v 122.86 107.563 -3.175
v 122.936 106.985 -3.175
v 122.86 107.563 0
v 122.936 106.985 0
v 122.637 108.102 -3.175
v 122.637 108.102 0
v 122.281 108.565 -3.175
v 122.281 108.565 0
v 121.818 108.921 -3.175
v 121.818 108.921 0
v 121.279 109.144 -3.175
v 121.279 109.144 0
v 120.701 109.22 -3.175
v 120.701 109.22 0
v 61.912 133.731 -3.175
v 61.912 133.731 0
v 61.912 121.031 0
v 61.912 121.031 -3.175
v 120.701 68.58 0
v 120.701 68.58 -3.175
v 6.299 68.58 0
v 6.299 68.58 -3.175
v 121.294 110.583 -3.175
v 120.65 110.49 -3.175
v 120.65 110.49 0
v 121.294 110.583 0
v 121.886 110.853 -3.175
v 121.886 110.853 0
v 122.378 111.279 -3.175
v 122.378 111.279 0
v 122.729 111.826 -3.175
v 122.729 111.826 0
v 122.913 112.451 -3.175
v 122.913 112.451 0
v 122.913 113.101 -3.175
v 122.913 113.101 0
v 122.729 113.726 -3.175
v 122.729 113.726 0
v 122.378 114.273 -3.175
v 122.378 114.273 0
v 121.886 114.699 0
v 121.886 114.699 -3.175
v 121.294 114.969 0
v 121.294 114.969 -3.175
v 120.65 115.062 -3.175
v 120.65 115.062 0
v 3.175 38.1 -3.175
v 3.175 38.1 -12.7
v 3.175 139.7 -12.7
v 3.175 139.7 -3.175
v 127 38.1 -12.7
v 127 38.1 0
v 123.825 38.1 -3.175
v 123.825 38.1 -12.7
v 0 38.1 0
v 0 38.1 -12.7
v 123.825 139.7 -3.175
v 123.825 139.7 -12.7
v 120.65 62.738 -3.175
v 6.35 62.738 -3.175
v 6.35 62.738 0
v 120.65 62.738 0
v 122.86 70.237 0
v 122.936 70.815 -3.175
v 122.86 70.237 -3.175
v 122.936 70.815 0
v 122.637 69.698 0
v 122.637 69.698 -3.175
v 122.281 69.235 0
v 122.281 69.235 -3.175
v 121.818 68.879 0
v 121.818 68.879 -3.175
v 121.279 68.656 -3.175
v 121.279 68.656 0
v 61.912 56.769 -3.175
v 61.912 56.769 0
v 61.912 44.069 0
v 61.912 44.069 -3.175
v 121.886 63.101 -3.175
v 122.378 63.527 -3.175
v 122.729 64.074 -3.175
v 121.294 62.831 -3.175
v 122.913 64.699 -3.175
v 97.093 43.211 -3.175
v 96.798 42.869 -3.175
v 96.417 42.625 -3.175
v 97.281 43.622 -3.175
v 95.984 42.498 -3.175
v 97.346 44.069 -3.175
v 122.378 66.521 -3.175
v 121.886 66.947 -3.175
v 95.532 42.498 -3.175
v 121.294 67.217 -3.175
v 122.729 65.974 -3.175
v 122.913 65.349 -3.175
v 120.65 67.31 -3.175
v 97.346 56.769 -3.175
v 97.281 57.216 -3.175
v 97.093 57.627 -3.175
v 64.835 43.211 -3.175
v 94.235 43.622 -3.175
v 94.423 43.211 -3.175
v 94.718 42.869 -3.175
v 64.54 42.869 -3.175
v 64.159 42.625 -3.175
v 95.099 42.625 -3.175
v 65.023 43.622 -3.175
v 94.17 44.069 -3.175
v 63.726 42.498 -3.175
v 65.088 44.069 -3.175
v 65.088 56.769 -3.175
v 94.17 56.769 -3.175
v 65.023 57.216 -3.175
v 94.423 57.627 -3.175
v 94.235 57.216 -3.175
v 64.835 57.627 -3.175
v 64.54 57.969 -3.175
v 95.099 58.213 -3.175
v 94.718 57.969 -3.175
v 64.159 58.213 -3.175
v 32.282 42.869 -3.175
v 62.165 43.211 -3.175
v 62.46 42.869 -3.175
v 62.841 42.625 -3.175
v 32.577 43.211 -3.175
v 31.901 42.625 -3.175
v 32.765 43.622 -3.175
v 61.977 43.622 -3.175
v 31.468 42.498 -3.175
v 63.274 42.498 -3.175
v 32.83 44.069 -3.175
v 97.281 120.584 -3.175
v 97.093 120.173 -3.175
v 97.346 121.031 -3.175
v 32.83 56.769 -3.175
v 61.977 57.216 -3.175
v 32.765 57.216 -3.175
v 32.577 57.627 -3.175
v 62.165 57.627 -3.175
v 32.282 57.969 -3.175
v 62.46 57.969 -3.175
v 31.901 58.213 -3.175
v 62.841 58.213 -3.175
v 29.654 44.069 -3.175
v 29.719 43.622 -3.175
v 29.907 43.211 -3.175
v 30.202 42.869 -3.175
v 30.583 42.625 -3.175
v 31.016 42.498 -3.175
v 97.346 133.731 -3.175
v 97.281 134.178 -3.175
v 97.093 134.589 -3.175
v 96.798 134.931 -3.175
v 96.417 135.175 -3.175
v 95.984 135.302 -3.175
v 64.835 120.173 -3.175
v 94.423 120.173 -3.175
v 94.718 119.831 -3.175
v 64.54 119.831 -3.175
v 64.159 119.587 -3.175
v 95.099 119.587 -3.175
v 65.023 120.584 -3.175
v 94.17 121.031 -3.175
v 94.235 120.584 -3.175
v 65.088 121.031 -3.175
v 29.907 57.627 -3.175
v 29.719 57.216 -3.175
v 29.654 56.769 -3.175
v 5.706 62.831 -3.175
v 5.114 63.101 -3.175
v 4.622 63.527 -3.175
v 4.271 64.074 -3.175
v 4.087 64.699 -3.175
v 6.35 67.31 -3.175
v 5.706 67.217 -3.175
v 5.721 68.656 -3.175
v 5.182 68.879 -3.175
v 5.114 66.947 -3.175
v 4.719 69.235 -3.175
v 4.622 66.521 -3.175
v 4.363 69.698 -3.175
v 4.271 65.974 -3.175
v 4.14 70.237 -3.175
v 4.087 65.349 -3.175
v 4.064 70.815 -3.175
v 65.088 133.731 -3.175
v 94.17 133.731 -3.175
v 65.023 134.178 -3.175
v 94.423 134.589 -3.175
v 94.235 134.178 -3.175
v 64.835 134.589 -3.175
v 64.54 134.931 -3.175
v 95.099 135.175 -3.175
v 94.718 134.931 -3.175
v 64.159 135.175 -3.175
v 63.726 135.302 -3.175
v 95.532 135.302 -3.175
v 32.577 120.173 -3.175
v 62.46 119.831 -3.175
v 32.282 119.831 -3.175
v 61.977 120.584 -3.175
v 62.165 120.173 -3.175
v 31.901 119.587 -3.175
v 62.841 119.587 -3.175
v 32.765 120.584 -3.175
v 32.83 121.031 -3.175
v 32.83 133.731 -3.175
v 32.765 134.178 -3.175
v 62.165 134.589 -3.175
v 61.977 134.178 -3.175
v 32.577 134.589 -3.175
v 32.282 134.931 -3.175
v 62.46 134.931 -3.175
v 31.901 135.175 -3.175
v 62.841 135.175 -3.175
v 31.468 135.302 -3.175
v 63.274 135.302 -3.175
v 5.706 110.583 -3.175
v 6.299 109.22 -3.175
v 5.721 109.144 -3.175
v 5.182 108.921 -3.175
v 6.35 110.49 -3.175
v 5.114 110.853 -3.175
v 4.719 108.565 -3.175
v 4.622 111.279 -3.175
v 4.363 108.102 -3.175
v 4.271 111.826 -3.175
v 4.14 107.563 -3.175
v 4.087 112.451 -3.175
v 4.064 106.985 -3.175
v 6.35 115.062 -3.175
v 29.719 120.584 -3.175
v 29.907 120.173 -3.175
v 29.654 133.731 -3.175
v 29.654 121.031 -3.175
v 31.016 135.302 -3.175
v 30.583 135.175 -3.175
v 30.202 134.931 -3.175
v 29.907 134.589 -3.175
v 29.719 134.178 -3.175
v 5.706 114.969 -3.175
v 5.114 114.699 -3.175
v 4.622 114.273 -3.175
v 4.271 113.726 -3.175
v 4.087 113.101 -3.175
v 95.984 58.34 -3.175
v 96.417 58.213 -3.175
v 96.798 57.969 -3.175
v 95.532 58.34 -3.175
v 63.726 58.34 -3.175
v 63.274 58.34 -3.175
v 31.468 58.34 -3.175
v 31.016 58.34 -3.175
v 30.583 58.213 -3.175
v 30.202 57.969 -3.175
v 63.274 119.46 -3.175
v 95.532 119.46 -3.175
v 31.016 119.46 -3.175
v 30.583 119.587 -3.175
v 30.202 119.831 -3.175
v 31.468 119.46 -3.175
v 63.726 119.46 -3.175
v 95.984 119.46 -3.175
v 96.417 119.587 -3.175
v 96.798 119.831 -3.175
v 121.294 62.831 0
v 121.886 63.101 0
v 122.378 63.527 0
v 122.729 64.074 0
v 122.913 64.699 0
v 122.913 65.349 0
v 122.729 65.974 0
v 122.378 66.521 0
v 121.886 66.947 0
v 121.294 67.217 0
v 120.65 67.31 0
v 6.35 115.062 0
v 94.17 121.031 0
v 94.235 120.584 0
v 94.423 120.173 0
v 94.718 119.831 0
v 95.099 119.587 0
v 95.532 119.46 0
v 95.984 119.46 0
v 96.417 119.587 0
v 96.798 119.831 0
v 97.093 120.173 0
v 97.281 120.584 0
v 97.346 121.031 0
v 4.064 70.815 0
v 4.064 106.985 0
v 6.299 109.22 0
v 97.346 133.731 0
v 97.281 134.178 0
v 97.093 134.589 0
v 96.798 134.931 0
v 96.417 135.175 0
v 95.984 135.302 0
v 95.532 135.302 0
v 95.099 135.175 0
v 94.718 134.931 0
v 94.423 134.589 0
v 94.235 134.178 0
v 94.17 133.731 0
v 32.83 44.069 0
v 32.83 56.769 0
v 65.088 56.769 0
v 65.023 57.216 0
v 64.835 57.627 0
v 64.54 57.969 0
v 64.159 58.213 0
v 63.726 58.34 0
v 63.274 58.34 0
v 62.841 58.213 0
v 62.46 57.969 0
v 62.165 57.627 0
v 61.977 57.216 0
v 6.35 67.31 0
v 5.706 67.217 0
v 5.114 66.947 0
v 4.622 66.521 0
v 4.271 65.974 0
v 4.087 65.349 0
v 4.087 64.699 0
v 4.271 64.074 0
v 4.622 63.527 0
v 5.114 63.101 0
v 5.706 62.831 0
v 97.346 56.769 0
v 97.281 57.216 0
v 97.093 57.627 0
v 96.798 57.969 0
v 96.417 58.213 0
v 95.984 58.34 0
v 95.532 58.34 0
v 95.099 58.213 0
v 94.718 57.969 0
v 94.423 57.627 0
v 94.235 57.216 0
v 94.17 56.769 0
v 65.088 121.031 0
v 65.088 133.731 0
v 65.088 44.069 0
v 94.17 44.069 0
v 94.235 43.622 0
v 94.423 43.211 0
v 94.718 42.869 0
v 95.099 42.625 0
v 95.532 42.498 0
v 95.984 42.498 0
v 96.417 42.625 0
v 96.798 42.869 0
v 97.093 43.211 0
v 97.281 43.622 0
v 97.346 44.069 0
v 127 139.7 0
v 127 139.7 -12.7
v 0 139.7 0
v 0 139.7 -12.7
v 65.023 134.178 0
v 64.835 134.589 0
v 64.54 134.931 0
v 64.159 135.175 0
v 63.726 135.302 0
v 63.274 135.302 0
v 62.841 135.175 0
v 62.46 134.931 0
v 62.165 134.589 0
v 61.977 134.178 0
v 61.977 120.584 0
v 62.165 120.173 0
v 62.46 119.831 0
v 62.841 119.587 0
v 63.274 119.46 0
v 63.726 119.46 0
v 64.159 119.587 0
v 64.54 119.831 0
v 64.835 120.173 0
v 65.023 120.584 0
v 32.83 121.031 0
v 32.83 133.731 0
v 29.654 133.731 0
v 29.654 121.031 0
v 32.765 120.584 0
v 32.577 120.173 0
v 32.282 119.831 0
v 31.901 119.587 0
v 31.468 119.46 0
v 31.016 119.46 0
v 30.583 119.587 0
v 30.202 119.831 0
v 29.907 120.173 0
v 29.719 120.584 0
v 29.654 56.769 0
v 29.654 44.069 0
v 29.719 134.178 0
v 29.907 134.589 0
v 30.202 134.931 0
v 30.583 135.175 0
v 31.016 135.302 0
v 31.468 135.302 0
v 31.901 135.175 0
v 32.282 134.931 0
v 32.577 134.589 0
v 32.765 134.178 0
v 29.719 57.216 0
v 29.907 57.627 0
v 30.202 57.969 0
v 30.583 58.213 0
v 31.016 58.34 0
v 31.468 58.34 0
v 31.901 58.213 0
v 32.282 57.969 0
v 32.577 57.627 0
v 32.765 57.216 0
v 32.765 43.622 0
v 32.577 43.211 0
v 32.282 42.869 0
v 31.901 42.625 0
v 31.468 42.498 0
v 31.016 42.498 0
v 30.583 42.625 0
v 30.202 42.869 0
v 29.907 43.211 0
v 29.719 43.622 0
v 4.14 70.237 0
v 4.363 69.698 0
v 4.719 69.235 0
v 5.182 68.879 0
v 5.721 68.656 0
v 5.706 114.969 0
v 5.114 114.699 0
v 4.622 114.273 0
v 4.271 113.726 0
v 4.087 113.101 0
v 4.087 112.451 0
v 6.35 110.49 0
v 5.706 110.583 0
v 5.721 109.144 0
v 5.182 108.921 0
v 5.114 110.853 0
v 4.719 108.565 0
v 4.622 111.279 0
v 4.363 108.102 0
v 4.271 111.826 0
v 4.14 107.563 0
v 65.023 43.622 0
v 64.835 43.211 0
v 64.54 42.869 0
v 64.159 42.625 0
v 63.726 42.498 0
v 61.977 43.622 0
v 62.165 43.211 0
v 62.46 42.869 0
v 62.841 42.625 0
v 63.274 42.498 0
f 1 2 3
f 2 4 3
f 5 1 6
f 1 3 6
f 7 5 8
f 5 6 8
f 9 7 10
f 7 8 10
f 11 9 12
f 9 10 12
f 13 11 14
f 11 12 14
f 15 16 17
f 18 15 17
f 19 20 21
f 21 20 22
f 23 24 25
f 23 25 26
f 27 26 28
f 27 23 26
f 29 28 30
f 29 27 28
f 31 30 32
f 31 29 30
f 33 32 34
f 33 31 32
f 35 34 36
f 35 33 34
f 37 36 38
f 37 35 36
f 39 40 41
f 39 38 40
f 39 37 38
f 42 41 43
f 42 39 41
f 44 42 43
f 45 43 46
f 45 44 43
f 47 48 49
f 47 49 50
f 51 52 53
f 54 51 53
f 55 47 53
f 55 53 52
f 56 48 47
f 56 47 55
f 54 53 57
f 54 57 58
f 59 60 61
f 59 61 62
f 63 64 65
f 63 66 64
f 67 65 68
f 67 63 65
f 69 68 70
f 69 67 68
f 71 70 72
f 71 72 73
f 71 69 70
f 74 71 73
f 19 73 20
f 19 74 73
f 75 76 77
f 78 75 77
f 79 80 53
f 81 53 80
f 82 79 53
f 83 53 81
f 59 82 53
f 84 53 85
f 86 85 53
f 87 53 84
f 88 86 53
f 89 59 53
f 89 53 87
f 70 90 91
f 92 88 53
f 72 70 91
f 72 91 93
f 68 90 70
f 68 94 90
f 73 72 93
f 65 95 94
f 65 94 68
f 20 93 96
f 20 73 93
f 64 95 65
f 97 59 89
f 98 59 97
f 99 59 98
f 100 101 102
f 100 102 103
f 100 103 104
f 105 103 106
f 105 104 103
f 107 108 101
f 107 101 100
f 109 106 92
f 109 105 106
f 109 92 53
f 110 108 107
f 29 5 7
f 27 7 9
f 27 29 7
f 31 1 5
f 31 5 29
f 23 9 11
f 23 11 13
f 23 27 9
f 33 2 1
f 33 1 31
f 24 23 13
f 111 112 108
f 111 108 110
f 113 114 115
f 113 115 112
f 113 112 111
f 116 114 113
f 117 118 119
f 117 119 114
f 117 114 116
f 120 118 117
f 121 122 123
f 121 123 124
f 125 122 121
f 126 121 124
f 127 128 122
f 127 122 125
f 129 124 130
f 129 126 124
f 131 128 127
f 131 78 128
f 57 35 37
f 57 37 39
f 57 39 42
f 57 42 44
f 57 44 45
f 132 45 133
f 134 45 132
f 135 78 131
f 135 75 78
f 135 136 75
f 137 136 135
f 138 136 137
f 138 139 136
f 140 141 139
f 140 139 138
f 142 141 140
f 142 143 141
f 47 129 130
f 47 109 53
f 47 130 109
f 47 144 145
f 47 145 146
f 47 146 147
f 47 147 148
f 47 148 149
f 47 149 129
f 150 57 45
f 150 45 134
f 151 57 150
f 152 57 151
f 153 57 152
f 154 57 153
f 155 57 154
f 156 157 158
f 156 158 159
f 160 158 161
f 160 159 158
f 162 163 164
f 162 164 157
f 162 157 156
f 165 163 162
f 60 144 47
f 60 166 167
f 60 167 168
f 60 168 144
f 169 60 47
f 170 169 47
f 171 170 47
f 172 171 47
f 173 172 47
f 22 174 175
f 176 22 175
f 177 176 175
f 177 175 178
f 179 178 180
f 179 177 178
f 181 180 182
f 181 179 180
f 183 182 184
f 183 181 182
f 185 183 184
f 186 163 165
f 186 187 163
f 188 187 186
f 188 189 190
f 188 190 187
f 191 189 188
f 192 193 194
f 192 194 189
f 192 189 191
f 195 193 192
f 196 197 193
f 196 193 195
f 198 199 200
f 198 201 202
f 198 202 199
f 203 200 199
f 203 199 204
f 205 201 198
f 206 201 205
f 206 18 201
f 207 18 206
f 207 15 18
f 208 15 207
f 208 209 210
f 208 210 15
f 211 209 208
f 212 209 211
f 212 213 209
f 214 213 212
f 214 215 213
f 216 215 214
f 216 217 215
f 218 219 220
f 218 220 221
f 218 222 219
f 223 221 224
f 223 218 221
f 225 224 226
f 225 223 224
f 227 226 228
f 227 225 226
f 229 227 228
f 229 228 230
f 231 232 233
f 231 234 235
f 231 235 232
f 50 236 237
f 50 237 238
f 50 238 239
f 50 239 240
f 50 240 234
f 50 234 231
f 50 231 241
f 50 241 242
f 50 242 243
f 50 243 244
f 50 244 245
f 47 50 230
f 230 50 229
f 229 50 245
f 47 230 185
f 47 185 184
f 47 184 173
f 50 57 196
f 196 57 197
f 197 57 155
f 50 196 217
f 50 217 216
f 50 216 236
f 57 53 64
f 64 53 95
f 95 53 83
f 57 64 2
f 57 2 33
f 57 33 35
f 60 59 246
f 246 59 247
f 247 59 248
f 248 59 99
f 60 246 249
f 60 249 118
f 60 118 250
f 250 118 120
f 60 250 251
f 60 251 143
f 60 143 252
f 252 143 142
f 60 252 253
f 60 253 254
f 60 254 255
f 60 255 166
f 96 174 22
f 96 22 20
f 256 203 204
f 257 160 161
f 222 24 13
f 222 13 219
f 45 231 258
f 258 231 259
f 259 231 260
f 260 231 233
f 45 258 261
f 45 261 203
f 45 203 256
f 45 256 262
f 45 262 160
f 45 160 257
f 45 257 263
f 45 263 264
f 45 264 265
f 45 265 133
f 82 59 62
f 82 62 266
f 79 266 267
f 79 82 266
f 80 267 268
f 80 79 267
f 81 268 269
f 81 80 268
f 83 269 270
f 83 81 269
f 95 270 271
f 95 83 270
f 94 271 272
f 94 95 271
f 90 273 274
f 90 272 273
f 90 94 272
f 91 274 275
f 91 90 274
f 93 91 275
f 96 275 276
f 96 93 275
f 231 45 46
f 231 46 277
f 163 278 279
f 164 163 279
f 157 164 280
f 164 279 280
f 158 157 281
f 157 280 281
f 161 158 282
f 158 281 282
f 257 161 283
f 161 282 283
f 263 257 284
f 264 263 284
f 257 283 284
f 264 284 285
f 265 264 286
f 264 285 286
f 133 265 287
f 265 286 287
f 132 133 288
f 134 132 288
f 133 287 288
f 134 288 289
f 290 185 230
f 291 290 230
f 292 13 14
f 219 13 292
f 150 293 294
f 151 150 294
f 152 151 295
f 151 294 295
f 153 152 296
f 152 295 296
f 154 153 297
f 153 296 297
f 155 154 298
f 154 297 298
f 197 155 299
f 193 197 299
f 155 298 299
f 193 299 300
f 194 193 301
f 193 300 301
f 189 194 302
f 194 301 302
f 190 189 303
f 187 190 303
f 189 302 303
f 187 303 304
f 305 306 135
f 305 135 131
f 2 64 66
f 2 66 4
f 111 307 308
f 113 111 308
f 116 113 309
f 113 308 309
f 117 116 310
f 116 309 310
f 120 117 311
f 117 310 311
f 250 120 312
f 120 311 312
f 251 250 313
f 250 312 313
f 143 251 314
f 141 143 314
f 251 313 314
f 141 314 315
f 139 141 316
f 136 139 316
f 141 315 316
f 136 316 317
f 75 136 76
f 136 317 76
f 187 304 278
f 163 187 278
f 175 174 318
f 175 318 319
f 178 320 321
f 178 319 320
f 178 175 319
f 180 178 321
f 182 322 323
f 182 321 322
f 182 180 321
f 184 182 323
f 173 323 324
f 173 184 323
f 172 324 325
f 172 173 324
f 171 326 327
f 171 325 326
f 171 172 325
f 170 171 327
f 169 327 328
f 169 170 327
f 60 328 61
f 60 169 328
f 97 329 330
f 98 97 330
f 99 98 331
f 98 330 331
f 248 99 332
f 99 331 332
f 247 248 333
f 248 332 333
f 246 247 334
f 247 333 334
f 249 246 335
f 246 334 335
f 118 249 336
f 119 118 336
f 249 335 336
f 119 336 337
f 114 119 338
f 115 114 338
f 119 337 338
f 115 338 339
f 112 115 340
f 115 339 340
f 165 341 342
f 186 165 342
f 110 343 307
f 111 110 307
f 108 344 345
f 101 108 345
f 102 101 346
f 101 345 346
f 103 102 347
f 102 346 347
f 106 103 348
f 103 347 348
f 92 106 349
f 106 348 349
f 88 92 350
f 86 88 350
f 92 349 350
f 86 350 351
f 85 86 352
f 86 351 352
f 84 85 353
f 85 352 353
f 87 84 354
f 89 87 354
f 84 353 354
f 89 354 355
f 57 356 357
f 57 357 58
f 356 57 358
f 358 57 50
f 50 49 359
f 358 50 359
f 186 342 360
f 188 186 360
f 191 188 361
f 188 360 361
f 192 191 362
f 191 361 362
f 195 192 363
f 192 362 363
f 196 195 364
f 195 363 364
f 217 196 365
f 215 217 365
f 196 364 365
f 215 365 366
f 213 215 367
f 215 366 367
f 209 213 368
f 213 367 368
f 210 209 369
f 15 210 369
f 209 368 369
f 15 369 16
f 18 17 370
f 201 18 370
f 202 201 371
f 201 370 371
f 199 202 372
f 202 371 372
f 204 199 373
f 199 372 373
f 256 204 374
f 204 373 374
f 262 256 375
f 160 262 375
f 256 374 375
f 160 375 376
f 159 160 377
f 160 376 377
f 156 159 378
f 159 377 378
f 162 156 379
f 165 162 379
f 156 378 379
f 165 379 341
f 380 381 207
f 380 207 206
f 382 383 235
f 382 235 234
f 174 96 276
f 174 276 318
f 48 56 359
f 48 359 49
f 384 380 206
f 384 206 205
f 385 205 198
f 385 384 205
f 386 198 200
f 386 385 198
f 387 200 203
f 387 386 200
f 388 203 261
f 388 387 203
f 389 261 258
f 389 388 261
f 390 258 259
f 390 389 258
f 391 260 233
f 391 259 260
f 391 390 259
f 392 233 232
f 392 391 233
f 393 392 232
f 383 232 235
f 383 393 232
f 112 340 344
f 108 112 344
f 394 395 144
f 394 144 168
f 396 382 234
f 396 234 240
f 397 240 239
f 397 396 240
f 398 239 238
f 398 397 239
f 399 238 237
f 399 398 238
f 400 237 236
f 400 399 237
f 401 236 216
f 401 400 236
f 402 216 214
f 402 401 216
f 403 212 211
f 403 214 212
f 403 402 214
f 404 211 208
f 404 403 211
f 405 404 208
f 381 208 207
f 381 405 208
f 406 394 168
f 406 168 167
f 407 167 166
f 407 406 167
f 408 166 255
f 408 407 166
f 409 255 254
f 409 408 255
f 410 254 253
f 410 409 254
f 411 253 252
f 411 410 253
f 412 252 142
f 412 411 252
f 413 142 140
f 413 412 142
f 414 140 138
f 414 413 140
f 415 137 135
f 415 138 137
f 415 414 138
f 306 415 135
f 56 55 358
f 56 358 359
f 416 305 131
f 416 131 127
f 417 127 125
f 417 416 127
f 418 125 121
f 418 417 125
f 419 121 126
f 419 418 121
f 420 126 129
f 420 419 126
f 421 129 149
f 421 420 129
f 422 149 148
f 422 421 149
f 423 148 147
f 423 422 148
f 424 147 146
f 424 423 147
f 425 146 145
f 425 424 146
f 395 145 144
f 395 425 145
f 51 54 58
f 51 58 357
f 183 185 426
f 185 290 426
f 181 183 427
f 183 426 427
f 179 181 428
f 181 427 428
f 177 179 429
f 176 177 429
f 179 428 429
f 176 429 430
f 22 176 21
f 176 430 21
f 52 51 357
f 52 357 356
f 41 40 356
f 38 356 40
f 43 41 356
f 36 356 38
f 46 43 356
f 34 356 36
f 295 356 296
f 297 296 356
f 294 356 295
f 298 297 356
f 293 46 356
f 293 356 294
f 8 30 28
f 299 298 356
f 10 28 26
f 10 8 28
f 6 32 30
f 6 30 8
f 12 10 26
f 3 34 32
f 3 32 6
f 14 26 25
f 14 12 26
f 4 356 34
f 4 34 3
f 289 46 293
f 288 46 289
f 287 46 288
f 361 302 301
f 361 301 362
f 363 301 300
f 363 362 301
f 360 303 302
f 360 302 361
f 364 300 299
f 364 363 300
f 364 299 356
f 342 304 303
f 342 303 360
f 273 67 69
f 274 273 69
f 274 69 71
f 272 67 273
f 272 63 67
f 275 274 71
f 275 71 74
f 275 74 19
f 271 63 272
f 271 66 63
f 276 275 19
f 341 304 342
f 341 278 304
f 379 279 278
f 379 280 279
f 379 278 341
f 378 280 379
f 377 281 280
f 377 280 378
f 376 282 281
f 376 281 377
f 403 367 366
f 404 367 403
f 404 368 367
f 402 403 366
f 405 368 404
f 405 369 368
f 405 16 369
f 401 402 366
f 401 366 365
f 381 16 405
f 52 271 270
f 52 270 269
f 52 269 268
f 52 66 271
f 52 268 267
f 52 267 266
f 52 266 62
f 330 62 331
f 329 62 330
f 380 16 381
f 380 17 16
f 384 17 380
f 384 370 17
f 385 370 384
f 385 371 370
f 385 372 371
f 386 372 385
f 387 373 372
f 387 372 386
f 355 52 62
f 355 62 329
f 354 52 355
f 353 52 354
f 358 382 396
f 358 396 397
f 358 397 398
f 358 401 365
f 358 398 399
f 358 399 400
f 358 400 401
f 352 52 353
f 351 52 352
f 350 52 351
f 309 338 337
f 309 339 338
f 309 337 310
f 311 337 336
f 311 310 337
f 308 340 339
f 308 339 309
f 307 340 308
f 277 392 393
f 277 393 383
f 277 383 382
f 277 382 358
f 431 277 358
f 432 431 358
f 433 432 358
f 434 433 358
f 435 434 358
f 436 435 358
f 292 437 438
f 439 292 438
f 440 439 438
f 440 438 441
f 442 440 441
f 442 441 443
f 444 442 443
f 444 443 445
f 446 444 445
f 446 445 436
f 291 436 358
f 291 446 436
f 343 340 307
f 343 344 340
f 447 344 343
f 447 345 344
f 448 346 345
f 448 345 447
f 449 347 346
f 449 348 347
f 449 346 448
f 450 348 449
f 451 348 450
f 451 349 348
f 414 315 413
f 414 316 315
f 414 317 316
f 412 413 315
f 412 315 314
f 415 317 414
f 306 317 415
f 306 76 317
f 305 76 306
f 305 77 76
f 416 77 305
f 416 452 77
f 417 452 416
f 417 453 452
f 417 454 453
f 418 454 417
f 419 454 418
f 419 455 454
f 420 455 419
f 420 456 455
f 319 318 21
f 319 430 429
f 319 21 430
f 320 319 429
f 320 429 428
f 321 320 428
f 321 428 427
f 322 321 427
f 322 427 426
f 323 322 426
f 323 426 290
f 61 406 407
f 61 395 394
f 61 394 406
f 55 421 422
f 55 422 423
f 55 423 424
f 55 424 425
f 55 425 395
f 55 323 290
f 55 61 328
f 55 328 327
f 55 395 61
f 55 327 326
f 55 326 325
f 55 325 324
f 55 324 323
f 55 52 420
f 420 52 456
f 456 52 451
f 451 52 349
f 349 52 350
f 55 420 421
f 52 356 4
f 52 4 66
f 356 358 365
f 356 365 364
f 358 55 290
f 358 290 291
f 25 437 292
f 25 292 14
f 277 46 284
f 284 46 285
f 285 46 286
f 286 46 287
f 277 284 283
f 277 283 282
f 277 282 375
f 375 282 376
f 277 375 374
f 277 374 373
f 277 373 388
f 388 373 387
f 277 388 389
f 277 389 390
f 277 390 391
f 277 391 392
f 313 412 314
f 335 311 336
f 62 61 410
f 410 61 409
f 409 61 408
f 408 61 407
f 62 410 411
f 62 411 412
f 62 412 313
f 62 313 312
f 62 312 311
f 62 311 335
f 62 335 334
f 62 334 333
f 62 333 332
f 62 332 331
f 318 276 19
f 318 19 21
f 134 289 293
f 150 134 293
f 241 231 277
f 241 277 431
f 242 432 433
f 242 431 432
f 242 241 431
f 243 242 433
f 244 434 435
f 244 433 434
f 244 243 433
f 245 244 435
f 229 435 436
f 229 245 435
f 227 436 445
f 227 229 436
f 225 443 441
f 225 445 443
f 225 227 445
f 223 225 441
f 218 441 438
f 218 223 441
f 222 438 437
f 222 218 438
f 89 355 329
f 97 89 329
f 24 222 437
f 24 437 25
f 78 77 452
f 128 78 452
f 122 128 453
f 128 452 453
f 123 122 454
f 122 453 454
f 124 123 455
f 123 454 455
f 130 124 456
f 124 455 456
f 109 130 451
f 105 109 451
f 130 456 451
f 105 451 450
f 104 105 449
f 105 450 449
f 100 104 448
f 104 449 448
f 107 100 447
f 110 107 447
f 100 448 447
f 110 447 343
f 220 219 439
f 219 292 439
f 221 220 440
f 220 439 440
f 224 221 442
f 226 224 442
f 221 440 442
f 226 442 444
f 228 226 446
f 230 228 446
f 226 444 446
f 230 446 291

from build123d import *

# Parameters (mm, degrees)
BOSS_EXTRUDE1_DEPTH     = 139.7
SKETCH3_W               = 118.872
SKETCH3_H               = 40.64
SKETCH3_W_2             = 127
SKETCH3_H_2             = 38.1
CUT_EXTRUDE1_DEPTH      = 10.525
CUT_EXTRUDE1_DEPTH_BACK = 4.175
FILLET1_R               = 2.2352
CUT_EXTRUDE2_DEPTH      = 13.7


with BuildPart() as part:
    # Sketch2 → Boss-Extrude1 (new body)
    with BuildSketch(Plane(origin=(0, 0, 0), x_dir=(1, 0, 0), z_dir=(0, 1, 0))):
        Polygon((0, 0), (0, 12.7), (3.175, 12.7), (3.175, 3.175), (123.825, 3.175), (123.825, 12.7), (127, 12.7), (127, 0), align=None)
    extrude(amount=BOSS_EXTRUDE1_DEPTH)

    # Sketch3 → Cut-Extrude1 (cut, two sides)
    with BuildSketch(Plane(origin=(0, 0, -3.175), x_dir=(-1, 0, 0), z_dir=(0, 0, -1))) as cut_extrude1_sk:
        with BuildLine():
            Line((-6.35, 110.49), (-120.65, 110.49))
            ThreePointArc((-120.65, 110.49), (-122.936, 112.776), (-120.65, 115.062))
            Line((-120.65, 115.062), (-6.35, 115.062))
            ThreePointArc((-6.35, 115.062), (-4.064, 112.776), (-6.35, 110.49))
        make_face()
        with BuildLine():
            Line((-6.35, 62.738), (-120.65, 62.738))
            ThreePointArc((-120.65, 62.738), (-122.936, 65.024), (-120.65, 67.31))
            Line((-120.65, 67.31), (-6.35, 67.31))
            ThreePointArc((-6.35, 67.31), (-4.064, 65.024), (-6.35, 62.738))
        make_face()
        with Locations((-63.5, 88.9)):
            Rectangle(SKETCH3_W, SKETCH3_H)
        with Locations((-63.5, 19.05)):
            Rectangle(SKETCH3_W_2, SKETCH3_H_2)
    extrude(amount=CUT_EXTRUDE1_DEPTH, mode=Mode.SUBTRACT)
    extrude(cut_extrude1_sk.sketch, amount=-CUT_EXTRUDE1_DEPTH_BACK, mode=Mode.SUBTRACT)

    # Fillet1
    fillet1_edges = [part.edges().sort_by_distance(p)[0] for p in [
        (4.064, 68.58, -1.5875),
        (122.936, 68.58, -1.5875),
        (122.936, 109.22, -1.5875),
        (4.064, 109.22, -1.5875),
    ]]
    fillet(fillet1_edges, radius=FILLET1_R)

    # Sketch4 → Cut-Extrude2 (cut, through all)
    with BuildSketch(Plane.XY):
        with BuildLine():
            Line((32.8295, 133.731), (32.8295, 121.031))
            ThreePointArc((32.8295, 121.031), (31.242, 119.4435), (29.6545, 121.031))
            Line((29.6545, 121.031), (29.6545, 133.731))
            ThreePointArc((29.6545, 133.731), (31.242, 135.3185), (32.8295, 133.731))
        make_face()
        with BuildLine():
            Line((32.8295, 56.769), (32.8295, 44.069))
            ThreePointArc((32.8295, 44.069), (31.242, 42.4815), (29.6545, 44.069))
            Line((29.6545, 44.069), (29.6545, 56.769))
            ThreePointArc((29.6545, 56.769), (31.242, 58.3565), (32.8295, 56.769))
        make_face()
        with BuildLine():
            Line((61.9125, 133.731), (61.9125, 121.031))
            ThreePointArc((61.9125, 121.031), (63.5, 119.4435), (65.0875, 121.031))
            Line((65.0875, 121.031), (65.0875, 133.731))
            ThreePointArc((65.0875, 133.731), (63.5, 135.3185), (61.9125, 133.731))
        make_face()
        with BuildLine():
            Line((61.9125, 56.769), (61.9125, 44.069))
            ThreePointArc((61.9125, 44.069), (63.5, 42.4815), (65.0875, 44.069))
            Line((65.0875, 44.069), (65.0875, 56.769))
            ThreePointArc((65.0875, 56.769), (63.5, 58.3565), (61.9125, 56.769))
        make_face()
        with BuildLine():
            Line((94.1705, 133.731), (94.1705, 121.031))
            ThreePointArc((94.1705, 121.031), (95.758, 119.4435), (97.3455, 121.031))
            Line((97.3455, 121.031), (97.3455, 133.731))
            ThreePointArc((97.3455, 133.731), (95.758, 135.3185), (94.1705, 133.731))
        make_face()
        with BuildLine():
            Line((94.1705, 56.769), (94.1705, 44.069))
            ThreePointArc((94.1705, 44.069), (95.758, 42.4815), (97.3455, 44.069))
            Line((97.3455, 44.069), (97.3455, 56.769))
            ThreePointArc((97.3455, 56.769), (95.758, 58.3565), (94.1705, 56.769))
        make_face()
    extrude(amount=-CUT_EXTRUDE2_DEPTH, mode=Mode.SUBTRACT)


solid = part.part
